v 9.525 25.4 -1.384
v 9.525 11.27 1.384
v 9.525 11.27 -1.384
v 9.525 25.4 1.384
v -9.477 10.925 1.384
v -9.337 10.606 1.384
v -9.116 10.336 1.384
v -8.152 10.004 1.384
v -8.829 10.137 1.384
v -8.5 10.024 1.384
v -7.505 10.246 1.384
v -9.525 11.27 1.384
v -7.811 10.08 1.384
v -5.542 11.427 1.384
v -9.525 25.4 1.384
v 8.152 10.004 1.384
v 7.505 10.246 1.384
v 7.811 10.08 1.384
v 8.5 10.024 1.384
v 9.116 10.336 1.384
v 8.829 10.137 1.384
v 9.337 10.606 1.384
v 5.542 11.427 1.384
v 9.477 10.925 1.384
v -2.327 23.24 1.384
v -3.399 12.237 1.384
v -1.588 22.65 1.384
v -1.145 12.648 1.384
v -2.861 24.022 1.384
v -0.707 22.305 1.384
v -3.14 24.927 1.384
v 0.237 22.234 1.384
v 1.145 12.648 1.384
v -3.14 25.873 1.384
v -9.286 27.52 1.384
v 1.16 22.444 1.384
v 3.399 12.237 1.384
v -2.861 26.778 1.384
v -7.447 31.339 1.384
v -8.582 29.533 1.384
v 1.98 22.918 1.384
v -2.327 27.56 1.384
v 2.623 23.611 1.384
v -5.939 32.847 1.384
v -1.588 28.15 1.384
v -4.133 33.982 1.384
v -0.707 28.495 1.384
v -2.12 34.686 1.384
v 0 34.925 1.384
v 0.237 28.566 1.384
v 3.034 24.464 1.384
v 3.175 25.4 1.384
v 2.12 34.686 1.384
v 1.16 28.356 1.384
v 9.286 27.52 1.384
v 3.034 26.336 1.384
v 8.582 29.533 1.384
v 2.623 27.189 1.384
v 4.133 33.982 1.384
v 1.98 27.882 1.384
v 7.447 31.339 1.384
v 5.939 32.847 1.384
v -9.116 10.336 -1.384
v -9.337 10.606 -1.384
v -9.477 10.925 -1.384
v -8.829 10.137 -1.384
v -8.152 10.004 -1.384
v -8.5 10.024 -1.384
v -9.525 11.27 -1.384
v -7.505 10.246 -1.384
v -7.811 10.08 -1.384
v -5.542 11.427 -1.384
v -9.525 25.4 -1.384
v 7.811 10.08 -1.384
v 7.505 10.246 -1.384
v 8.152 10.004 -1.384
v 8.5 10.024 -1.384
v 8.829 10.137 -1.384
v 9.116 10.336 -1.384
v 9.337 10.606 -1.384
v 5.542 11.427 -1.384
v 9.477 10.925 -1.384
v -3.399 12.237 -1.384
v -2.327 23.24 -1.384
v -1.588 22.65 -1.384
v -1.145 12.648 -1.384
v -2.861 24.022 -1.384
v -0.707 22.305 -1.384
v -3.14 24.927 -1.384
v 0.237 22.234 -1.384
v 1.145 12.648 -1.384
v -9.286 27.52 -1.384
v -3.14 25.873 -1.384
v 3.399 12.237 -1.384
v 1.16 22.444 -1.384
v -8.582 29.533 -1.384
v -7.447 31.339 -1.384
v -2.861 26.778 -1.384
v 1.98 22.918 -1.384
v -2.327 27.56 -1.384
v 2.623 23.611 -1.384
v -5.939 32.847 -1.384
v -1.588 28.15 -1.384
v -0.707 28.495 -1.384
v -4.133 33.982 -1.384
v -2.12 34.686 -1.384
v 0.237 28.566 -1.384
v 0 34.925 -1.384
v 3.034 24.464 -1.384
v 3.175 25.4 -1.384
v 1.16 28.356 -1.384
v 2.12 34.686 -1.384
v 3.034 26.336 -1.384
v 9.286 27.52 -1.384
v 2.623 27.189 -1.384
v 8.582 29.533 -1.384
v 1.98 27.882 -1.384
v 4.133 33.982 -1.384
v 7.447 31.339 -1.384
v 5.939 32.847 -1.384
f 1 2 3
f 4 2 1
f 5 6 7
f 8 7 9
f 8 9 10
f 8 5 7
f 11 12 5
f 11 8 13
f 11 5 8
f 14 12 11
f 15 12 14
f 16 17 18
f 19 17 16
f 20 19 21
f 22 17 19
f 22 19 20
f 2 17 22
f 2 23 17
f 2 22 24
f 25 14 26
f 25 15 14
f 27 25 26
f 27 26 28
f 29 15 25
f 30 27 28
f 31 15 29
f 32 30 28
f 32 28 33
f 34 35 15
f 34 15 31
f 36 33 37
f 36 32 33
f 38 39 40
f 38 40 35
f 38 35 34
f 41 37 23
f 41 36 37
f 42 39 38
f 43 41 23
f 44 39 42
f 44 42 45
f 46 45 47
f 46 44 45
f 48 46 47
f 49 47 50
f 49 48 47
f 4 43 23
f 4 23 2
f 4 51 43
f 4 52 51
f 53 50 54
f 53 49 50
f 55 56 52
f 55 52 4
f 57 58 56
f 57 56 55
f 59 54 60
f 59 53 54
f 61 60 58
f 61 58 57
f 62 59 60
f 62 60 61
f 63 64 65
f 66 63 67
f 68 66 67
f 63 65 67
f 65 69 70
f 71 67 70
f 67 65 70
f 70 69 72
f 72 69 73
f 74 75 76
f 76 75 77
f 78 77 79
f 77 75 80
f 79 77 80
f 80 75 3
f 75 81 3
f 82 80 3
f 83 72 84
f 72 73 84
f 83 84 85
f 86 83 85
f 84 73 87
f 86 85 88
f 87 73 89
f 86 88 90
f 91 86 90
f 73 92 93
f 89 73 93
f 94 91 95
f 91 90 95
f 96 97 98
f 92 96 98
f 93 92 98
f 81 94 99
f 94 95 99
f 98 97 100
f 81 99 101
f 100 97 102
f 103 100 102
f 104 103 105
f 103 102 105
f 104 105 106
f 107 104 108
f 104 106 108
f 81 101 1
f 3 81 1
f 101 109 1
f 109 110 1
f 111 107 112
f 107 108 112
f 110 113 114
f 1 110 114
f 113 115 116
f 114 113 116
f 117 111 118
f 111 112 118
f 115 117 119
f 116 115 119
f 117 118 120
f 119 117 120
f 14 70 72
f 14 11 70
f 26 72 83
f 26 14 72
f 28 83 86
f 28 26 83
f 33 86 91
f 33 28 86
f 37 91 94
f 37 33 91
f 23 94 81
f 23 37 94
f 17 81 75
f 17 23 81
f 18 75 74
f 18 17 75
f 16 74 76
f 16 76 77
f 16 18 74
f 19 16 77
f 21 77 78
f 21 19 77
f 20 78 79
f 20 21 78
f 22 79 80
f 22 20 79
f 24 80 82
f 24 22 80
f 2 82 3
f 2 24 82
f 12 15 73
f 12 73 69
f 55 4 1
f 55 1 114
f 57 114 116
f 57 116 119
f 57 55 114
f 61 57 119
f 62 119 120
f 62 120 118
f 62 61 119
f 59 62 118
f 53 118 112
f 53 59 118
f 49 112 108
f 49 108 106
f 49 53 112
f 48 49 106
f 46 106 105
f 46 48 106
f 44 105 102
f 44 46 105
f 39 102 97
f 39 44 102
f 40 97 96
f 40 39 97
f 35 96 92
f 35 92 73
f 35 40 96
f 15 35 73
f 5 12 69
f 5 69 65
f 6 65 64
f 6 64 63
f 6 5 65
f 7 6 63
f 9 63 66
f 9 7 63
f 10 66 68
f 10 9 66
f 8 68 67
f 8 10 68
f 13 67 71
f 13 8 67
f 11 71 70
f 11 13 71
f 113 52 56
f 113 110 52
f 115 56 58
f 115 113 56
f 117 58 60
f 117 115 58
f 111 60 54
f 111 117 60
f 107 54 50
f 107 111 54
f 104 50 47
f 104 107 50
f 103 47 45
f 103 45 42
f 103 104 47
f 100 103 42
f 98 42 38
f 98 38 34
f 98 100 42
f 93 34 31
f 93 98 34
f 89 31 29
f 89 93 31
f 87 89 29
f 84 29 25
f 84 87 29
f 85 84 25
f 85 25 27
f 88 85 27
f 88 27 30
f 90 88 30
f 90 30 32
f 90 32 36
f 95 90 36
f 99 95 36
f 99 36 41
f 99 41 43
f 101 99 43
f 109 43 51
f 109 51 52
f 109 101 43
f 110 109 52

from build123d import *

# Parameters (mm, degrees)
SKETCH1_R           = 3.175
BOSS_EXTRUDE1_DEPTH = 1.3843


with BuildPart() as part:
    # Sketch1 → Boss-Extrude1 (new body, symmetric)
    with BuildSketch(Plane.XY):
        with BuildLine():
            Line((9.525, 11.270131987), (9.525, 25.4))
            ThreePointArc((9.525, 25.4), (0, 34.925), (-9.525, 25.4))
            Line((-9.525, 25.4), (-9.525, 11.270131987))
            ThreePointArc((-9.525, 11.270131987), (-8.829379111, 10.137441104), (-7.504545455, 10.245574533))
            ThreePointArc((-7.504545455, 10.245574533), (0, 12.7), (7.504545455, 10.245574533))
            ThreePointArc((7.504545455, 10.245574533), (8.829379111, 10.137441104), (9.525, 11.270131987))
        make_face()
        with Locations((0, 25.4)):
            Circle(SKETCH1_R, mode=Mode.SUBTRACT)
    extrude(amount=BOSS_EXTRUDE1_DEPTH, both=True)


solid = part.part
